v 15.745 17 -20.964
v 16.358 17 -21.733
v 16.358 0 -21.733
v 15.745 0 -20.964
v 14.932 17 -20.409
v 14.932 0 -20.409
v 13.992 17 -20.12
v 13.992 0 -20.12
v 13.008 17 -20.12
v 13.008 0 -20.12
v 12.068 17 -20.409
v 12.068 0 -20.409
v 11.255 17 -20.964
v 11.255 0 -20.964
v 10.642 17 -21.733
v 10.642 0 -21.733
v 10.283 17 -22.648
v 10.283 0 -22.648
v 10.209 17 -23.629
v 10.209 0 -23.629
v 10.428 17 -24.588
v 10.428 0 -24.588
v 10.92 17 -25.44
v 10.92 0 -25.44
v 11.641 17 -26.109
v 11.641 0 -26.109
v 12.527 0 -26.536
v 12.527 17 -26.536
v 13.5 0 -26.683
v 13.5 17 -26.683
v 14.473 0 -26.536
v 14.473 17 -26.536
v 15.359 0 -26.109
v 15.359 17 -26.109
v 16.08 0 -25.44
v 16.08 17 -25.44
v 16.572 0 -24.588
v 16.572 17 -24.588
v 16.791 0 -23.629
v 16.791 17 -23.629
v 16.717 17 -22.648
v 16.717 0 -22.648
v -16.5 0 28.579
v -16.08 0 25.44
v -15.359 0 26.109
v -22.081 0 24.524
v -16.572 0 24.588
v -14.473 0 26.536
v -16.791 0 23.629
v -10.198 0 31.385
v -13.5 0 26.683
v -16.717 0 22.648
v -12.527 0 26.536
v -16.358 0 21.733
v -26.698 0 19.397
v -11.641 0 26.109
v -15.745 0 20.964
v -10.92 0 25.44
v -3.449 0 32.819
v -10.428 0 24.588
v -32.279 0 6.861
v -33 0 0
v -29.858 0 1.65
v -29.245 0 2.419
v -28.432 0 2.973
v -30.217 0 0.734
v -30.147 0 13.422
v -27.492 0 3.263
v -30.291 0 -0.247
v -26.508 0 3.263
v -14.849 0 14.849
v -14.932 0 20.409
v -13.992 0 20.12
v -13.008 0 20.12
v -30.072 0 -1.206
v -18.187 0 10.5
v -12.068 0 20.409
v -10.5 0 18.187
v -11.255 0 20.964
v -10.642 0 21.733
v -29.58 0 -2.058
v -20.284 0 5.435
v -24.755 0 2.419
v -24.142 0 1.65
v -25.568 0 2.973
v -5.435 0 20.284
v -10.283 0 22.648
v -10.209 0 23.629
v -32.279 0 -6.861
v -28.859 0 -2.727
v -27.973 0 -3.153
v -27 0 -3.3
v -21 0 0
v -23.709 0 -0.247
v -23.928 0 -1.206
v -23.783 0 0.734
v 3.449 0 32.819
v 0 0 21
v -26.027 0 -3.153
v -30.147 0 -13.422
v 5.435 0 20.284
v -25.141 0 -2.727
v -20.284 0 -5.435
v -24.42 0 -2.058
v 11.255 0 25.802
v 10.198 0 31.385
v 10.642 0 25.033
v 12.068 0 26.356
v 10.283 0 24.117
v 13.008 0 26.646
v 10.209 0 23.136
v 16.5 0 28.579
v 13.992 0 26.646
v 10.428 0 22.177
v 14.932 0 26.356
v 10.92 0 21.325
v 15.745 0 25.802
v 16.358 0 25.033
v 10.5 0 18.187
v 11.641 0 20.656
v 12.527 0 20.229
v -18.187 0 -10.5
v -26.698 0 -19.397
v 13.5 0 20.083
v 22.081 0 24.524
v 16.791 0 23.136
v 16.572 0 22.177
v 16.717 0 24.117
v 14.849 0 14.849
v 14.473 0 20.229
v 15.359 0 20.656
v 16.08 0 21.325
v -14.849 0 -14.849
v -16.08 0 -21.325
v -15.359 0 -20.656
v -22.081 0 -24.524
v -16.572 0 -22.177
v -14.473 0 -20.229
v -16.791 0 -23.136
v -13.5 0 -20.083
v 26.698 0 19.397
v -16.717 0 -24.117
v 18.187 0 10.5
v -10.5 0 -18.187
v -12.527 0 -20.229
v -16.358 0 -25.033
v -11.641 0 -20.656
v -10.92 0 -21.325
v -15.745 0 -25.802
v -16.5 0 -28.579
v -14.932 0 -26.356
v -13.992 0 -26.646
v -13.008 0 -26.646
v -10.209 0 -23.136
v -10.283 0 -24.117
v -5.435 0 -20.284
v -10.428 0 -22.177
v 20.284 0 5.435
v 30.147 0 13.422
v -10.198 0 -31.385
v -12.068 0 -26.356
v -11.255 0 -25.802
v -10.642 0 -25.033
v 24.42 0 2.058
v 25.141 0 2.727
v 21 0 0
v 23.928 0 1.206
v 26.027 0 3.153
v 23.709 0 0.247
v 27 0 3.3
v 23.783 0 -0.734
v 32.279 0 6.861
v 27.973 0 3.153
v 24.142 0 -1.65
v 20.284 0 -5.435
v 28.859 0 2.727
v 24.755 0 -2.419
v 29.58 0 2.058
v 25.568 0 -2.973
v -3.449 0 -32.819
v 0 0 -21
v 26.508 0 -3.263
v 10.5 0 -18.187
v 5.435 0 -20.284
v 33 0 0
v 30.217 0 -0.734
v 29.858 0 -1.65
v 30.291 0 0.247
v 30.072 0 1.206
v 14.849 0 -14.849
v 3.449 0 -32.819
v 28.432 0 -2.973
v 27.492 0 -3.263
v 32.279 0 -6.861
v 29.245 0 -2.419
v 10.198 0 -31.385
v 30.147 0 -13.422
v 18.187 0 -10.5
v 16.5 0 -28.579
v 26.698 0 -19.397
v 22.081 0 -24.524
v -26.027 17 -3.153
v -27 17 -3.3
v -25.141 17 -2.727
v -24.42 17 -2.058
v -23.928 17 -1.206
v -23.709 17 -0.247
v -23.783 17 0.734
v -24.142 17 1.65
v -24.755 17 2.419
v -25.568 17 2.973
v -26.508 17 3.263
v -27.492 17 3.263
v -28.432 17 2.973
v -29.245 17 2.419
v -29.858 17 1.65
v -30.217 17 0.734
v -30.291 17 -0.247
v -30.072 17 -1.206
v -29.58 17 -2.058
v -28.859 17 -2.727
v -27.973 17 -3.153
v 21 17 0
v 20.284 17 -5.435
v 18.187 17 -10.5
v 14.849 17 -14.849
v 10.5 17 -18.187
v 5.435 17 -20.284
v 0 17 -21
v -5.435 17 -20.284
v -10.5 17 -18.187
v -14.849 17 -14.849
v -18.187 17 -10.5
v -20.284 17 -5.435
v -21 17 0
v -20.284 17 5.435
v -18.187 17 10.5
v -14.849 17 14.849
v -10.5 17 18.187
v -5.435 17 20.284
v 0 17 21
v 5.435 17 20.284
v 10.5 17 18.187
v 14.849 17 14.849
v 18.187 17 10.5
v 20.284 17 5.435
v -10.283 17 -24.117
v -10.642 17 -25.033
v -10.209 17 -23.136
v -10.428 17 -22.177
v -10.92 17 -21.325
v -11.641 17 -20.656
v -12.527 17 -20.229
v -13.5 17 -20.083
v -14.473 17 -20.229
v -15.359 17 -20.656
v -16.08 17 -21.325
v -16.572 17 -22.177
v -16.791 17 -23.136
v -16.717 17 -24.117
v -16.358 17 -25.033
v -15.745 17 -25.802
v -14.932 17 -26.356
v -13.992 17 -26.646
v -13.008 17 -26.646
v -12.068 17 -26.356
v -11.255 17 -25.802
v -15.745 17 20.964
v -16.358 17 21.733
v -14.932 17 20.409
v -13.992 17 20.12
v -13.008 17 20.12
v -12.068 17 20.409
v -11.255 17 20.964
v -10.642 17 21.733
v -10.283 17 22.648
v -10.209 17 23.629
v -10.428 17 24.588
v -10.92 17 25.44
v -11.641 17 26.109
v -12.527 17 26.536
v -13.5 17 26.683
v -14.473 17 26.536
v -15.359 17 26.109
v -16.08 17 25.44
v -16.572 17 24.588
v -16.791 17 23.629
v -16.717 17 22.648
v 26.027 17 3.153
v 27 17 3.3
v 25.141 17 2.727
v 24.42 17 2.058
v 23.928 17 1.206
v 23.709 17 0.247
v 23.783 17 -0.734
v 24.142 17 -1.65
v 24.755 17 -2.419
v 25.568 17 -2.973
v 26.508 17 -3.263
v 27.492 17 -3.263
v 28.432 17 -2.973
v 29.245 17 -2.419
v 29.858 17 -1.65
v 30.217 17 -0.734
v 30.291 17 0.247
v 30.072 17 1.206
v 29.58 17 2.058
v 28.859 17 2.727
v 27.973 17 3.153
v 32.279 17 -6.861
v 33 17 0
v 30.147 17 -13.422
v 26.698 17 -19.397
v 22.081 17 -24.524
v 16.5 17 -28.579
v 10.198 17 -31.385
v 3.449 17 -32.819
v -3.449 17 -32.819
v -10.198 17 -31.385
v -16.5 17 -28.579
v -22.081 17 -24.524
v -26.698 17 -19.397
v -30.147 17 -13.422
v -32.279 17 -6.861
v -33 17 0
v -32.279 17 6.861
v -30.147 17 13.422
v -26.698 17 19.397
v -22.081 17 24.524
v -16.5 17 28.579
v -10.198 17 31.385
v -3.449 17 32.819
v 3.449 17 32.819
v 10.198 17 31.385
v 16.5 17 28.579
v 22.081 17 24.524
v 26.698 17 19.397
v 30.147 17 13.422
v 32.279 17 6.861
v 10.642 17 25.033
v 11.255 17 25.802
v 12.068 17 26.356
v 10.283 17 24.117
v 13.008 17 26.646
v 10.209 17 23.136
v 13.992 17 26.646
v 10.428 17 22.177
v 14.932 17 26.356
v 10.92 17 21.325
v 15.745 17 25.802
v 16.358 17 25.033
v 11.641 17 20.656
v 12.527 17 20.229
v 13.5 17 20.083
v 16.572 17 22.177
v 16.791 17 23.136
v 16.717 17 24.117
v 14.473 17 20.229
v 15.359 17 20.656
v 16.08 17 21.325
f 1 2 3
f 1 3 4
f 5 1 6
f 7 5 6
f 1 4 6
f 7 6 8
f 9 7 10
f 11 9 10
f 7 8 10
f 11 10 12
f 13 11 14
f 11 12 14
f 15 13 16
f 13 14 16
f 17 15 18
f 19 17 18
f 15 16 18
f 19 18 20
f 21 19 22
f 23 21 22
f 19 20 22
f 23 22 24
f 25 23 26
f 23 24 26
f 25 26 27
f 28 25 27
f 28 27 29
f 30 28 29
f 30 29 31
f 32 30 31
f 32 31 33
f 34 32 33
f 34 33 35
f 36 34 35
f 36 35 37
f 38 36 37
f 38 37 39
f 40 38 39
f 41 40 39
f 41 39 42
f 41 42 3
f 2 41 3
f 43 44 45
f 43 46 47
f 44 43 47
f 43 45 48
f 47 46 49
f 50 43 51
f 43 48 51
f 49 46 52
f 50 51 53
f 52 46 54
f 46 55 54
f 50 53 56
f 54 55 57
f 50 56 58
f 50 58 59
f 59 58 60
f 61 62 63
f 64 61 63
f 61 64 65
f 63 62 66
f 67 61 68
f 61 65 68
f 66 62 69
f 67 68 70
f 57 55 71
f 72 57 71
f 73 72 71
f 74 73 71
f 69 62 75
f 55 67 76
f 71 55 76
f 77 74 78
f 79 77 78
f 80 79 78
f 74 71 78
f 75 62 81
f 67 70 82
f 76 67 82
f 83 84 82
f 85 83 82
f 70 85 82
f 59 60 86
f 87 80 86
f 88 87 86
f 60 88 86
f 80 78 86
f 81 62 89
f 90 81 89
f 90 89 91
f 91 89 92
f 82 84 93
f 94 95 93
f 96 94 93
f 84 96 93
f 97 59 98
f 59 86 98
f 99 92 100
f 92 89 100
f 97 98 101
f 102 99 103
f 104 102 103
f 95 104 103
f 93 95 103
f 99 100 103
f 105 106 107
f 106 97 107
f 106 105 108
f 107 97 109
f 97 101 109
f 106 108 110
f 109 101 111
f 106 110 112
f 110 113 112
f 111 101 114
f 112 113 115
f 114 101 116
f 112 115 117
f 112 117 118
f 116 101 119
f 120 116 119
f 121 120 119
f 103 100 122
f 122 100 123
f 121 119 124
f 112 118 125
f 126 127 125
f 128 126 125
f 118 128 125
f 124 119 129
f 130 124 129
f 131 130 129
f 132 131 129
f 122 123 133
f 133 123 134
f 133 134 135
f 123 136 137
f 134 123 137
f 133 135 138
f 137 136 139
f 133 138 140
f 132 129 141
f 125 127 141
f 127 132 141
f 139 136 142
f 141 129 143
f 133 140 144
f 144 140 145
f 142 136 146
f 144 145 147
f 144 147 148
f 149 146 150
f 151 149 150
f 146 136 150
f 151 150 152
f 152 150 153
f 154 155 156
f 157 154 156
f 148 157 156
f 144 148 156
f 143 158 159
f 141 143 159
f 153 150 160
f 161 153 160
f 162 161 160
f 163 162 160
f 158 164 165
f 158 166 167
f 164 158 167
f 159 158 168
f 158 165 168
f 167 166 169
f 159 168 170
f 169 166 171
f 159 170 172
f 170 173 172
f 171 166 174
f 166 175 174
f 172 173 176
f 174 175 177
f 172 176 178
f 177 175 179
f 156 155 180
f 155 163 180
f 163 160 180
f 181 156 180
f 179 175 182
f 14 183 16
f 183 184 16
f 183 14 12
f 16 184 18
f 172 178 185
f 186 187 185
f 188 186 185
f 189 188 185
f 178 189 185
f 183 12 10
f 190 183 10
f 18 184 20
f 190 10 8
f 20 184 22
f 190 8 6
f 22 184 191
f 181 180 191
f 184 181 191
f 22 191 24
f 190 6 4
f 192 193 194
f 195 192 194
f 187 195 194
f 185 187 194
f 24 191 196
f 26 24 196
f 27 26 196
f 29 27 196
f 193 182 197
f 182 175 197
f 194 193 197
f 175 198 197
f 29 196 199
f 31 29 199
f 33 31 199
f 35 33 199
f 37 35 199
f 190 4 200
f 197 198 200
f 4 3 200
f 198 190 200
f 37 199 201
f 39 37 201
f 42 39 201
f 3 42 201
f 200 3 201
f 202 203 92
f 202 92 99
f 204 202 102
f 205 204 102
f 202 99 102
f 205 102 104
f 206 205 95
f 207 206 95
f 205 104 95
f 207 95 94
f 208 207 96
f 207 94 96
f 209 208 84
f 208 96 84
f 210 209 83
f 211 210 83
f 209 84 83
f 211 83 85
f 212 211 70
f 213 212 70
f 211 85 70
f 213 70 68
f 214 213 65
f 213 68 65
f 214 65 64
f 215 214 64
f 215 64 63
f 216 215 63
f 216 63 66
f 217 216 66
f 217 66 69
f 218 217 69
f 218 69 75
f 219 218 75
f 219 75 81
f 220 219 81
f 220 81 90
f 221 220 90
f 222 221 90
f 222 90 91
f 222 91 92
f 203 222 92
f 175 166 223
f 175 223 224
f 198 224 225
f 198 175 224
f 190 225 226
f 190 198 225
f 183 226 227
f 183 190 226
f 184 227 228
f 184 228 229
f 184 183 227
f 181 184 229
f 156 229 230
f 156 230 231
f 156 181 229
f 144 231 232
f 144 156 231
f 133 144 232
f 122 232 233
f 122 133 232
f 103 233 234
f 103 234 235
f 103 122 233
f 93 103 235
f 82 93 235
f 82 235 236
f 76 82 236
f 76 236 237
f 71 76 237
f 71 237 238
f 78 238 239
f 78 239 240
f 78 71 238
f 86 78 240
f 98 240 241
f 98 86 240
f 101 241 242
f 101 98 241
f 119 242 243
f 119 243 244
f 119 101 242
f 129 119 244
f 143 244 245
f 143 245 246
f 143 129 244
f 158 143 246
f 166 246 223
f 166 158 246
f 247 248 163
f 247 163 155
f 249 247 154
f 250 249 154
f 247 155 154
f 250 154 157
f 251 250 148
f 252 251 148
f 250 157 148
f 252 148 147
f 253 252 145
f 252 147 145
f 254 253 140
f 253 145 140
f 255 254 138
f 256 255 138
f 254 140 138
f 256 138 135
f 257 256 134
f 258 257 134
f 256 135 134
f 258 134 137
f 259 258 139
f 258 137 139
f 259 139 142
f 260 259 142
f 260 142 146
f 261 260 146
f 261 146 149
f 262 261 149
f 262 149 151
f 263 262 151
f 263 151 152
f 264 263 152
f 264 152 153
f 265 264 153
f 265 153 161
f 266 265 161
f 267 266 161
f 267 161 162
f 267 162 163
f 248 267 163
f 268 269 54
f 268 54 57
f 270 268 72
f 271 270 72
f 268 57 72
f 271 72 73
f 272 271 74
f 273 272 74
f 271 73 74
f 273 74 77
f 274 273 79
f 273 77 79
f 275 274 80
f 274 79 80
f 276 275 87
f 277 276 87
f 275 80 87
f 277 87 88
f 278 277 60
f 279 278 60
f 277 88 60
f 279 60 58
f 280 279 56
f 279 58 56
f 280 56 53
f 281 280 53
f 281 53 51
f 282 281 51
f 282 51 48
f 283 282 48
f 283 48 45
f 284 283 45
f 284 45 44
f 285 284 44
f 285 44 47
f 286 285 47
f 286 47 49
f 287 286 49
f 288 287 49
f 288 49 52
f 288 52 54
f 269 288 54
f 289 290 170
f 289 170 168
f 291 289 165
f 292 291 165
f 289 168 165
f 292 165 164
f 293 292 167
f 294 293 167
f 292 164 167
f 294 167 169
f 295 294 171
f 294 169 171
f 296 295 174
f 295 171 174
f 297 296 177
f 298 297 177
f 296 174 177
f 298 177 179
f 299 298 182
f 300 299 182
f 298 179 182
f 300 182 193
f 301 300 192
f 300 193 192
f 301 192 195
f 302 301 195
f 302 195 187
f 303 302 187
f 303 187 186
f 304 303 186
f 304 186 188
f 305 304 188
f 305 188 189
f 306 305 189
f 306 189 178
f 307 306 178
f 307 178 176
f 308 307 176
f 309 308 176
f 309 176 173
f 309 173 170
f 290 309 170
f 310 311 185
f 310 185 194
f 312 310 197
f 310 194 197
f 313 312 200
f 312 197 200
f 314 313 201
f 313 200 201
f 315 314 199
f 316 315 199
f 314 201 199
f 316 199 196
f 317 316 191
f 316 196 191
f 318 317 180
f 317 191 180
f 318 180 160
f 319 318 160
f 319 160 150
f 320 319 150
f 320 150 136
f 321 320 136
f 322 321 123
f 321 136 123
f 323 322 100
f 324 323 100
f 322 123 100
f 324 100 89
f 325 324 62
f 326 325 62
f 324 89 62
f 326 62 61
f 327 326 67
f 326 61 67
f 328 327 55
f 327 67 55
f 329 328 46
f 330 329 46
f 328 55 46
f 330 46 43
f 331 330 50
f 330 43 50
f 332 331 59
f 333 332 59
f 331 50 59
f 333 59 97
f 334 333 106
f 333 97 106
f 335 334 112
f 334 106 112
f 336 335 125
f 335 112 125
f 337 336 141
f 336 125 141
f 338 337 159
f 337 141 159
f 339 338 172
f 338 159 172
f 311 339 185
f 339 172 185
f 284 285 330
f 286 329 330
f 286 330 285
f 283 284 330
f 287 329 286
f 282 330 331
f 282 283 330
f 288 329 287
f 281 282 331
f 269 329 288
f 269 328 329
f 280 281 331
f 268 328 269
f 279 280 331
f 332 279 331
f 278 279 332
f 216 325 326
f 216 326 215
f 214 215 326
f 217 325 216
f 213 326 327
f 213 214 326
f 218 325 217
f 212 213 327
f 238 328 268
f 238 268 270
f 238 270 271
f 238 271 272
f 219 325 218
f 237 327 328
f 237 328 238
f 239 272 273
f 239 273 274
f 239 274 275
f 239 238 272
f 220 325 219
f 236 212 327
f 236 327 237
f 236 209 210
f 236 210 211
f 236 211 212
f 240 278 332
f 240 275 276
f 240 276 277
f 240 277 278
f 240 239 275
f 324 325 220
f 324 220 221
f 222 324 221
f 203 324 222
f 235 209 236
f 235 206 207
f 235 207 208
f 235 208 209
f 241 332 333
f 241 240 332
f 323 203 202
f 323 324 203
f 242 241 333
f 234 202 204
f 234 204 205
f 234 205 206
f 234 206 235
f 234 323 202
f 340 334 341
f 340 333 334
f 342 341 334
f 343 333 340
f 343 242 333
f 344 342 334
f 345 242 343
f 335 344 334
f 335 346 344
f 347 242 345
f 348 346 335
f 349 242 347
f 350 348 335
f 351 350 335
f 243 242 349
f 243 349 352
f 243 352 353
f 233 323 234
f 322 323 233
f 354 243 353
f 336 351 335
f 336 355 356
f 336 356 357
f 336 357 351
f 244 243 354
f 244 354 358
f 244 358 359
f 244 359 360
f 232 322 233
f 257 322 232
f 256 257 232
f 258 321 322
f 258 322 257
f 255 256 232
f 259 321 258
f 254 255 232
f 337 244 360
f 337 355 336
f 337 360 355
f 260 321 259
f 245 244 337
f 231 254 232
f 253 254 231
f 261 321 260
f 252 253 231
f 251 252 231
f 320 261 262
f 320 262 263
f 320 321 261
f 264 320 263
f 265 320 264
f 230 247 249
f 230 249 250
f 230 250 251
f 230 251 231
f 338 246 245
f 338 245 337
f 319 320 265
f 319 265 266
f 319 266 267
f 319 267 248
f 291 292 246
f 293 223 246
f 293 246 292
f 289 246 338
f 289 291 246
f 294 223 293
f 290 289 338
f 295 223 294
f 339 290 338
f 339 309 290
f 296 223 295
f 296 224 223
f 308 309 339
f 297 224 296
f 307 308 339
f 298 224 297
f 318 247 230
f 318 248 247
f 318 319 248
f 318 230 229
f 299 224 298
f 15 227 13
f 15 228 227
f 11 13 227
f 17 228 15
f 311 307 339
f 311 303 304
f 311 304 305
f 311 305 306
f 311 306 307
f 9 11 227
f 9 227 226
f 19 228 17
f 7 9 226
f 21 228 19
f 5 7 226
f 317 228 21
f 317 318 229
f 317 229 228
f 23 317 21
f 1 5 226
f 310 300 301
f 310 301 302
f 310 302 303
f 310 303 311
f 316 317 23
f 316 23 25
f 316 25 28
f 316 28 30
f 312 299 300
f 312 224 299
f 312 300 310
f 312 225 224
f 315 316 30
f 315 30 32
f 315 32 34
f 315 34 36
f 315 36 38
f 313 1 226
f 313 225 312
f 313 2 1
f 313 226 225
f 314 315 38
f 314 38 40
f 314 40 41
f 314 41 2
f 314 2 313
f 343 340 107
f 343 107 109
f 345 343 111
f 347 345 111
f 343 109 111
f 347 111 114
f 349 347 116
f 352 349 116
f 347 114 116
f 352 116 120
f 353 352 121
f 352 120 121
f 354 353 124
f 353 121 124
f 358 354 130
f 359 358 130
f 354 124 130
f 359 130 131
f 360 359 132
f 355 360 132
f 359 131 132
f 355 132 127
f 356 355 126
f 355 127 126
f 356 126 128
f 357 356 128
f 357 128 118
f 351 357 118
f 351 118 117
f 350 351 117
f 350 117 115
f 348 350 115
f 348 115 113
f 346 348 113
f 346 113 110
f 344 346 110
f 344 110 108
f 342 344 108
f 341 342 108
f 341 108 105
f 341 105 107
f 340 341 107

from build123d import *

# Parameters (mm, degrees)
SKETCH1_R                = 33
SKETCH1_R_2              = 21
BOSS_EXTRUDE1_DEPTH      = 17
M6_CLEARANCE_HOLE1_D     = 6.6
M6_CLEARANCE_HOLE1_DEPTH = 17
CIRPATTERN1_COUNT        = 6


with BuildPart() as part:
    # Sketch1 → Boss-Extrude1 (new body)
    with BuildSketch(Plane(origin=(0, 0, 0), x_dir=(1, 0, 0), z_dir=(0, 1, 0))):
        Circle(SKETCH1_R)
        Circle(SKETCH1_R_2, mode=Mode.SUBTRACT)
    extrude(amount=BOSS_EXTRUDE1_DEPTH)

    # M6 Clearance Hole1
    with Locations(Plane(origin=(-27, 17, 0), x_dir=(0, 0, 1), z_dir=(0, 1, 0))):
        with Locations((0, 0)):
            m6_clearance_hole1 = Hole(M6_CLEARANCE_HOLE1_D / 2, depth=M6_CLEARANCE_HOLE1_DEPTH)

    # CirPattern1: M6 Clearance Hole1 ×6 about axis
    cirpattern1_axis = Axis((0, 0, 0), (0, 1, 0))
    for i in range(1, CIRPATTERN1_COUNT):
        add(m6_clearance_hole1.rotate(cirpattern1_axis, i * 360 / CIRPATTERN1_COUNT), mode=Mode.SUBTRACT)


solid = part.part
